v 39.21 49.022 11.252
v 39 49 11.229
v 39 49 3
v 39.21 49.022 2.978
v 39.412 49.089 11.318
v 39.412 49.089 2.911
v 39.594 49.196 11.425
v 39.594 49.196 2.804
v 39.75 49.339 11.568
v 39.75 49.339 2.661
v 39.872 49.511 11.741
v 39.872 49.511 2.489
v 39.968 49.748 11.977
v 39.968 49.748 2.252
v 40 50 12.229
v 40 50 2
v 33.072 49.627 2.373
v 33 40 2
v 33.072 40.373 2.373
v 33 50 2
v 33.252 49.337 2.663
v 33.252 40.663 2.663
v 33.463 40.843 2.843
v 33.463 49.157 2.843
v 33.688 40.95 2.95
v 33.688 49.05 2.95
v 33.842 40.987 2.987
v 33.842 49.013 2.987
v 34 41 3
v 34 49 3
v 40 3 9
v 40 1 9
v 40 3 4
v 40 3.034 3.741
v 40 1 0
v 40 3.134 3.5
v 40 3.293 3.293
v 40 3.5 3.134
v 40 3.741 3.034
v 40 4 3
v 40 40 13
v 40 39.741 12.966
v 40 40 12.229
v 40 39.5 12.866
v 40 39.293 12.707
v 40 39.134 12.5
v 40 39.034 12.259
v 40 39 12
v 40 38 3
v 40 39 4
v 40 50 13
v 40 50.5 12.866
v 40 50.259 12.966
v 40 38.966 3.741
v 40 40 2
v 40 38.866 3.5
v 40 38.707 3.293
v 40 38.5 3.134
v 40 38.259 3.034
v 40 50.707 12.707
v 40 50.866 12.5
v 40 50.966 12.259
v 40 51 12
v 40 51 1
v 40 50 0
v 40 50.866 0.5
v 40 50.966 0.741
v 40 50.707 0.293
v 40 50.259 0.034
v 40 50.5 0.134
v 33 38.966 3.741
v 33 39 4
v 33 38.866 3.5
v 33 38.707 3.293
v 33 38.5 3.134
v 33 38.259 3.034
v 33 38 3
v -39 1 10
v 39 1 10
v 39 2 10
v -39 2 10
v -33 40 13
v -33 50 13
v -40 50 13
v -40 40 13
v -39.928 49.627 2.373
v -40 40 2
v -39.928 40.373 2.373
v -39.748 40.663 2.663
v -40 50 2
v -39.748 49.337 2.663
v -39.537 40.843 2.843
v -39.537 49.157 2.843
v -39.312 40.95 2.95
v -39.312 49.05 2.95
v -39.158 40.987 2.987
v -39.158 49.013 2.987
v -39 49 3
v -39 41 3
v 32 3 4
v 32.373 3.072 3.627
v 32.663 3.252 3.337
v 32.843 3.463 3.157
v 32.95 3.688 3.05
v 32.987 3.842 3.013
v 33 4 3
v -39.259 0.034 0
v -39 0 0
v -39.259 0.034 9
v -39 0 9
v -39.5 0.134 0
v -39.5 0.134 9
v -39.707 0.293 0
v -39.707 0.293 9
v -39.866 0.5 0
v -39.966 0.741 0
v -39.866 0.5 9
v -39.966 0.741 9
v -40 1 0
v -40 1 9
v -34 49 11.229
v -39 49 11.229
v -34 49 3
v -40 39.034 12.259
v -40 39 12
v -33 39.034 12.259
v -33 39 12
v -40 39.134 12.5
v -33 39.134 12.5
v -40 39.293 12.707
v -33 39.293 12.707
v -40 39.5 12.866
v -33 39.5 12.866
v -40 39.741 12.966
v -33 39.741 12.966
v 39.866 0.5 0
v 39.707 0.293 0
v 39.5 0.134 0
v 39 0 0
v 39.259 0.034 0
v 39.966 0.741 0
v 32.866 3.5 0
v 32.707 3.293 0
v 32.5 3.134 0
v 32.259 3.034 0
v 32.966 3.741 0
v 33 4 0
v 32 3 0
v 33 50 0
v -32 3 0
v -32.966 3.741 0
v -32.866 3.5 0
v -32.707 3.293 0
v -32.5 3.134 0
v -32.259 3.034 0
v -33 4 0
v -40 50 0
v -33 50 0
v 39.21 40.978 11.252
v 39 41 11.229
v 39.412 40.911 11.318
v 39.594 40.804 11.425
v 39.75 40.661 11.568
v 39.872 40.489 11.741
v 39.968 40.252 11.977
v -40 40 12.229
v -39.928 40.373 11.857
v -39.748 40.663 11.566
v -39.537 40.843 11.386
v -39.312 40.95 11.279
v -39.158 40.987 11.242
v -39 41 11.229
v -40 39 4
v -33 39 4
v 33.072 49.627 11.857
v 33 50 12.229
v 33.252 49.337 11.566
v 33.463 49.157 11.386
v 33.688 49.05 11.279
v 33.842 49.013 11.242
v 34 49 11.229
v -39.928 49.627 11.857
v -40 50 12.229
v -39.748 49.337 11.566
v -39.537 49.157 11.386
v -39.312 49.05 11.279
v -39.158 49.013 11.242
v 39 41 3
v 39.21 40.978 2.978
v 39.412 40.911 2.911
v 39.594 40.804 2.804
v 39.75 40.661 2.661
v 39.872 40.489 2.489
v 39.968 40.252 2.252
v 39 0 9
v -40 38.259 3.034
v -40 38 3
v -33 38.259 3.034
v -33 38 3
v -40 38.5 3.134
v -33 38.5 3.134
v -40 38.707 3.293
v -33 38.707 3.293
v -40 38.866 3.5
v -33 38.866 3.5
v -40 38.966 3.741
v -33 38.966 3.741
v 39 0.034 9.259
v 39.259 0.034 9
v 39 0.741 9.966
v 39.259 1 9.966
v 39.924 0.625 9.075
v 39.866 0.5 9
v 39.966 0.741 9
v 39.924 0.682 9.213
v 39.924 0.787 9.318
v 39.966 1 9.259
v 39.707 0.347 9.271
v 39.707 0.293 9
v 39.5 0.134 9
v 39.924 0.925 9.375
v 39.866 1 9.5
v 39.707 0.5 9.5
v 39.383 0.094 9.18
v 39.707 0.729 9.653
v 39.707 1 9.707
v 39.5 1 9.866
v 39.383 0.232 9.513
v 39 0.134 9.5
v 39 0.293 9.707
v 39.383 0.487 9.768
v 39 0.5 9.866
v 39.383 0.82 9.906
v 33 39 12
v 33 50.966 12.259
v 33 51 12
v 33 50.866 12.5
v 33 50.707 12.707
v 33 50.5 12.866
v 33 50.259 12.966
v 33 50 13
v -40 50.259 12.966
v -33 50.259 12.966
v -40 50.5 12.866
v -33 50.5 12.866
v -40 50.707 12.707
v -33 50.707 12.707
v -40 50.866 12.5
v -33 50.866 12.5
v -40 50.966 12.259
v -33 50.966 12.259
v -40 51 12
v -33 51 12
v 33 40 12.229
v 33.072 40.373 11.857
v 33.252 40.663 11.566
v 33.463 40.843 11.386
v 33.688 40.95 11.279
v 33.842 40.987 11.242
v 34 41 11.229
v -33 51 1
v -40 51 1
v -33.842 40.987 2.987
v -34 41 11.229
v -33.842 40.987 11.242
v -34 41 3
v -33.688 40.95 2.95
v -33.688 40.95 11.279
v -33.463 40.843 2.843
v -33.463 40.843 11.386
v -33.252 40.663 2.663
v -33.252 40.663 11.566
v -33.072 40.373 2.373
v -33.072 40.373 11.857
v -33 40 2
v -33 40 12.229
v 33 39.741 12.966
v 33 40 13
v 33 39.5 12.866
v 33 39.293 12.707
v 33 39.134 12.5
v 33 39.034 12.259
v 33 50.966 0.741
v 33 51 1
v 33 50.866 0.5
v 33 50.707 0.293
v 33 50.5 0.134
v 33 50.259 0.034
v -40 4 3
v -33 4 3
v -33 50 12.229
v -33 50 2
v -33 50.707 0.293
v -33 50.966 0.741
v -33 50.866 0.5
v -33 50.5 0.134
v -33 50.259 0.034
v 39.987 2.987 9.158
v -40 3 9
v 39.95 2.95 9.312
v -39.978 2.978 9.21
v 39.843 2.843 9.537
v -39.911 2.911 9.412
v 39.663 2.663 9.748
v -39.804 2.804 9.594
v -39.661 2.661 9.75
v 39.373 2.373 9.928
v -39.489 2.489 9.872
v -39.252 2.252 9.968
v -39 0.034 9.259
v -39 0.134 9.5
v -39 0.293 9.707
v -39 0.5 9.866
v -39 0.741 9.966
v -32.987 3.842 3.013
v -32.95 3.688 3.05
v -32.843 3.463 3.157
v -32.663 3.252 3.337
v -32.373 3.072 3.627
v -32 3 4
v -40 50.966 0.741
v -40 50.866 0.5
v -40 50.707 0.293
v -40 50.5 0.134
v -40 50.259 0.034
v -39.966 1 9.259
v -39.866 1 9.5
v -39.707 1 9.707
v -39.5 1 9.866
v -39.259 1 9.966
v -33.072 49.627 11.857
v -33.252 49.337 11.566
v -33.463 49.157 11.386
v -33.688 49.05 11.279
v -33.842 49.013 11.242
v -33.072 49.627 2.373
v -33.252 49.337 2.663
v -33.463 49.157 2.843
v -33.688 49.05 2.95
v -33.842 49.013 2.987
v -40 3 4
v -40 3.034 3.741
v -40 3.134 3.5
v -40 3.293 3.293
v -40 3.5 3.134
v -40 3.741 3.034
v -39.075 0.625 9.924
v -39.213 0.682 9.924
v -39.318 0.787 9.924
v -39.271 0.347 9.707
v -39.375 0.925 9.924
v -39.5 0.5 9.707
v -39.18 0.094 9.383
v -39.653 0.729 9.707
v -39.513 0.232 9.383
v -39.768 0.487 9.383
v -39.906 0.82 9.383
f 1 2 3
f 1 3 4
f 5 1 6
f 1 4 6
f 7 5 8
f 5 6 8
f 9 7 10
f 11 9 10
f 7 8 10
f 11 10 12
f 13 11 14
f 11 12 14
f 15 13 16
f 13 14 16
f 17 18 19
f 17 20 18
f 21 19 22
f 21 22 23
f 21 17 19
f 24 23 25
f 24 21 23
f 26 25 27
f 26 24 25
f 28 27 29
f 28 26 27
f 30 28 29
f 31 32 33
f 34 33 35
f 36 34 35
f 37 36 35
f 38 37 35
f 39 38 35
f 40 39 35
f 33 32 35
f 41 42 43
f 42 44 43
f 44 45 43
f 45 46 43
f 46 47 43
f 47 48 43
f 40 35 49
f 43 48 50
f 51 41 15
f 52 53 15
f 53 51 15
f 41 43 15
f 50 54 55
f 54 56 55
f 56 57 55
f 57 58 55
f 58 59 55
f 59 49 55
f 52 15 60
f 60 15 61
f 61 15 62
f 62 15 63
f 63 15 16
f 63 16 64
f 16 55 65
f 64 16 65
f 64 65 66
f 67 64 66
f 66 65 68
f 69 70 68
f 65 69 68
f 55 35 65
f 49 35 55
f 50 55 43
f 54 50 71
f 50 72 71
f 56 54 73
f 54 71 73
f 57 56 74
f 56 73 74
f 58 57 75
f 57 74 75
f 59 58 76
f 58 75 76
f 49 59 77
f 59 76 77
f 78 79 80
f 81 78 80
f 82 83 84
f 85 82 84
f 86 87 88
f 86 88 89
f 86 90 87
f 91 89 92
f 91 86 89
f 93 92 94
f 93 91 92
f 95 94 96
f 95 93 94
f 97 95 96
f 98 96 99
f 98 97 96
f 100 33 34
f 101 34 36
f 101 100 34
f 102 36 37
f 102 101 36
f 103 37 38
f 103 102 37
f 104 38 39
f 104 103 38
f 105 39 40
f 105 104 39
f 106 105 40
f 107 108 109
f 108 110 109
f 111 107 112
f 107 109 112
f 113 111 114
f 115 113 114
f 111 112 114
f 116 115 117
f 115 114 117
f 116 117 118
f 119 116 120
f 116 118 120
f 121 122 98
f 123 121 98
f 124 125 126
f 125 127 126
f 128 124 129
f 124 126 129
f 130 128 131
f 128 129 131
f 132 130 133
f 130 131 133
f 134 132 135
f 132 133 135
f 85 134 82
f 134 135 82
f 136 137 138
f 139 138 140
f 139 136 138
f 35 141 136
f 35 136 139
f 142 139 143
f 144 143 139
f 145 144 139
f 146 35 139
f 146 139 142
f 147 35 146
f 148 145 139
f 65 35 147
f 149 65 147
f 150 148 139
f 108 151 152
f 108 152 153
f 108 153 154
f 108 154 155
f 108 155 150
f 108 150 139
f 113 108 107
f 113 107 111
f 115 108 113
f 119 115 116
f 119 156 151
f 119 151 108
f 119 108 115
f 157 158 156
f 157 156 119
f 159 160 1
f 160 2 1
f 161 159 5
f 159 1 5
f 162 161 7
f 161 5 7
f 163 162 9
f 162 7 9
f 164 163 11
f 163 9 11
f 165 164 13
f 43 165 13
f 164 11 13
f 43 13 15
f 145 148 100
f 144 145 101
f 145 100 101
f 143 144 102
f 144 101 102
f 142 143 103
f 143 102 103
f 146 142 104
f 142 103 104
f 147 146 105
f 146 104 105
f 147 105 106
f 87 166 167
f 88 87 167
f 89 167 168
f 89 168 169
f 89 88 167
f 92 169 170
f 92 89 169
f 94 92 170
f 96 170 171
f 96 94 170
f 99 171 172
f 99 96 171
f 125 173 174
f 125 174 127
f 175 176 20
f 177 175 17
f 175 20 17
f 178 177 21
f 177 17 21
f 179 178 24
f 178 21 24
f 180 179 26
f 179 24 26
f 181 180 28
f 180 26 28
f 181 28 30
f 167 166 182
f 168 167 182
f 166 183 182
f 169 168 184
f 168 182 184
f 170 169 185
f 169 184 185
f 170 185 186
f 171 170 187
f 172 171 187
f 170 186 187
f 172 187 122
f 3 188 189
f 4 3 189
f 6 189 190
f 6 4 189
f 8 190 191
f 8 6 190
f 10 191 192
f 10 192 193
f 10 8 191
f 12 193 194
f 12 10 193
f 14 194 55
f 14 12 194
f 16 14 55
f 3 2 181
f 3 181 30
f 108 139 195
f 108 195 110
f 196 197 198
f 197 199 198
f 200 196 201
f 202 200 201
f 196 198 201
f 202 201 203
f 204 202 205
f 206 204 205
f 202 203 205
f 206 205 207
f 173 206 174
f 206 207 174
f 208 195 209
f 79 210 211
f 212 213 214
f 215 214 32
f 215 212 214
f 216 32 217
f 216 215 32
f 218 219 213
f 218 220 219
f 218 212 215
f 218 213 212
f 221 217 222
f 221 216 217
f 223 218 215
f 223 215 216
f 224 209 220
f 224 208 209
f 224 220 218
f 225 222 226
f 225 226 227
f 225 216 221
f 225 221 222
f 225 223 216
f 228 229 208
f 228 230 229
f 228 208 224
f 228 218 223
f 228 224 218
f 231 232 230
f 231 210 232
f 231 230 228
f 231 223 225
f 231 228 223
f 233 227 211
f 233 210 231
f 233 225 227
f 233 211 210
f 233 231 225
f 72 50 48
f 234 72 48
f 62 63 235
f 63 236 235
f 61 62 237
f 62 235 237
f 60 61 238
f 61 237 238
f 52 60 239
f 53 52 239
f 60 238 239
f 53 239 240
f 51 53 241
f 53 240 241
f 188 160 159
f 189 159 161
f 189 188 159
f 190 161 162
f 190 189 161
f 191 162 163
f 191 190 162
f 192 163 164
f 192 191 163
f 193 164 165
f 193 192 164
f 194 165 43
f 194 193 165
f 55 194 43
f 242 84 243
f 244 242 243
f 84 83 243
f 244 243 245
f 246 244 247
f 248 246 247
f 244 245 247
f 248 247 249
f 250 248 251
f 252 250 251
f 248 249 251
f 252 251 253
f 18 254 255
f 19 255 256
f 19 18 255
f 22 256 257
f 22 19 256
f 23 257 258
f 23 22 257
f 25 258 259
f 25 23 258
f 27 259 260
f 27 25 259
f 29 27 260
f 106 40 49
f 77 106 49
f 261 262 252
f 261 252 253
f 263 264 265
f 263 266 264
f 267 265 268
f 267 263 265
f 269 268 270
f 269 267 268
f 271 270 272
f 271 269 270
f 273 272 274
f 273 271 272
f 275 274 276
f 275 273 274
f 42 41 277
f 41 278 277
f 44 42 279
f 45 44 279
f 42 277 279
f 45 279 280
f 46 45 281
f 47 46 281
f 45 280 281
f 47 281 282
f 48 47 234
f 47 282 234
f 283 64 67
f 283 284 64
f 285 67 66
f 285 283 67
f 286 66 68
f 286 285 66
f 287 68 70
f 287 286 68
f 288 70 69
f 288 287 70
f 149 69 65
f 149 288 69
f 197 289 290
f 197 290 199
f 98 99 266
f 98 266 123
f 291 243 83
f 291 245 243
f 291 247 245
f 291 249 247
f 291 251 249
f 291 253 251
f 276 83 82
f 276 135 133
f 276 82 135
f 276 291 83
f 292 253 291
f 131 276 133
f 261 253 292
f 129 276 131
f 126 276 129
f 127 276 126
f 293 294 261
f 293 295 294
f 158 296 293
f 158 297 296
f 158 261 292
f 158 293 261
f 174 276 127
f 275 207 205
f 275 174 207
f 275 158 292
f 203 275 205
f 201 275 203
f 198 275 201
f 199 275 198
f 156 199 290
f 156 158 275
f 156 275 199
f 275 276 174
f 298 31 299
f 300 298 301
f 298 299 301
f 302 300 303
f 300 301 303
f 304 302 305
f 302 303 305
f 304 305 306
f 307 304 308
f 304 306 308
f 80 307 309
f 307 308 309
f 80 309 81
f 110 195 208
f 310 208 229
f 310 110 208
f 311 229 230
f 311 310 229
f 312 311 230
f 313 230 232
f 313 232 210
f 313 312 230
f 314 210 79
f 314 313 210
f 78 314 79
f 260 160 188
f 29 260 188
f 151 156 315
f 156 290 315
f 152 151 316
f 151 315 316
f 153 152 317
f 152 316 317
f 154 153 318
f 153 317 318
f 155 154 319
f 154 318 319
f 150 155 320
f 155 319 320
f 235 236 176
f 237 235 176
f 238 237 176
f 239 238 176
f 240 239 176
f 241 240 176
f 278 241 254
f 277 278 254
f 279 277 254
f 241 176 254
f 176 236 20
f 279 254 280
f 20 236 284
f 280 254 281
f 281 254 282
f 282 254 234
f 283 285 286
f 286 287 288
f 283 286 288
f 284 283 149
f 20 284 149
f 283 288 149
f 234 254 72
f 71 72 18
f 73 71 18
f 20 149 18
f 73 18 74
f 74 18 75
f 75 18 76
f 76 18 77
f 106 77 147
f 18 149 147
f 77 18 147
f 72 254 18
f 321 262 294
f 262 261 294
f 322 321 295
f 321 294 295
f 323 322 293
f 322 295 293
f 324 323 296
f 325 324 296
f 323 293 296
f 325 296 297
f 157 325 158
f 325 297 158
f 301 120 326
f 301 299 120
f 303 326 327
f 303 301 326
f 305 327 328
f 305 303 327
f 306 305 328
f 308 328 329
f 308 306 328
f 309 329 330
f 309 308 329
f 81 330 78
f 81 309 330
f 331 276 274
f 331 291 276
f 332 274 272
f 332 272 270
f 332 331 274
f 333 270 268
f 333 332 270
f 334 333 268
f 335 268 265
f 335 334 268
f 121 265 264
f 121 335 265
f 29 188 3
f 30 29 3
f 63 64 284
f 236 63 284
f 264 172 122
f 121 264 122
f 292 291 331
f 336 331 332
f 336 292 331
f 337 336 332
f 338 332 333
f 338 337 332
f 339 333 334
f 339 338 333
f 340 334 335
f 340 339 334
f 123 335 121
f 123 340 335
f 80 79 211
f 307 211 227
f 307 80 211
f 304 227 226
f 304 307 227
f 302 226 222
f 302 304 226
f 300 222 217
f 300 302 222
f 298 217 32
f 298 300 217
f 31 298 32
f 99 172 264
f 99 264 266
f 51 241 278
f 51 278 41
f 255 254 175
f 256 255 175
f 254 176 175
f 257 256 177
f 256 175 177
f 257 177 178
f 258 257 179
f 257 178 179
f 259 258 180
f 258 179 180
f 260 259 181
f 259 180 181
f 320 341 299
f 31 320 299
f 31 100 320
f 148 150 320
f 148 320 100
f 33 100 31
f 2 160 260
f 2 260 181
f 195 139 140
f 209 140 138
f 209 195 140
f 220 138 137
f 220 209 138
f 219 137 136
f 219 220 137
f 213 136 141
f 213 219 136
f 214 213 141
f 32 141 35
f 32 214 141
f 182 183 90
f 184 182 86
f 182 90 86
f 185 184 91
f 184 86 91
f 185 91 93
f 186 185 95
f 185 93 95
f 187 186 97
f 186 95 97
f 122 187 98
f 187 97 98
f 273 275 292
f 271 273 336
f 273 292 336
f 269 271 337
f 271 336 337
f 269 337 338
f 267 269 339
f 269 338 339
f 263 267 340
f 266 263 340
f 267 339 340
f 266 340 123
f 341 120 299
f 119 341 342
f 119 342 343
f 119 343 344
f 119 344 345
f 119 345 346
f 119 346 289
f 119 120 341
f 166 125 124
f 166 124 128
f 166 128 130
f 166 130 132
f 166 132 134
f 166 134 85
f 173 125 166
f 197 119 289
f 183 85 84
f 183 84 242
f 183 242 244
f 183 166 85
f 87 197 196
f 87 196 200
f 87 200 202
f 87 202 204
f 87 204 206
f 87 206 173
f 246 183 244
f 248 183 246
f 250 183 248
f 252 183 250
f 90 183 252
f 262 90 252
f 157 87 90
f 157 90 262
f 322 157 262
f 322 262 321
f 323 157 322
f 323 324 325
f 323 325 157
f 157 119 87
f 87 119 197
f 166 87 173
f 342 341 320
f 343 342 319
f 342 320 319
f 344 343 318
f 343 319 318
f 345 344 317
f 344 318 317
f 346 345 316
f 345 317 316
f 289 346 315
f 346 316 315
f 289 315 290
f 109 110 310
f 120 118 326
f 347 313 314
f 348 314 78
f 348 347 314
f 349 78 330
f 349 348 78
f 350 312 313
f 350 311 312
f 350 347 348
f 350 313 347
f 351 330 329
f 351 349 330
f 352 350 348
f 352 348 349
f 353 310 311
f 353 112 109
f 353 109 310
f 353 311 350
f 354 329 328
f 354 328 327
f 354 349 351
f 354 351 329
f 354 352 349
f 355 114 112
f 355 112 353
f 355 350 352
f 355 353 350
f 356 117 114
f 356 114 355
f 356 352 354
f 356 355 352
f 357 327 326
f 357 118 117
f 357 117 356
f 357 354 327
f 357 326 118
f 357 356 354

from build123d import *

# Parameters (mm, degrees)
BOSS_EXTRUDE1_DEPTH = 13
SKETCH2_W           = 8.229441325
SKETCH2_H           = 8
CUT_EXTRUDE1_DEPTH  = 100
FILLET1_R           = 1


with BuildPart() as part:
    # Sketch1 → Boss-Extrude1 (new body)
    with BuildSketch(Plane.XY):
        Polygon((0, 0), (40, 0), (40, 51), (33, 51), (33, 3), (0, 3), align=None)
    extrude(amount=BOSS_EXTRUDE1_DEPTH)

    # Sketch2 → Cut-Extrude1 (cut)
    with BuildSketch(Plane(origin=(40, 0, 0), x_dir=(0, 0, -1), z_dir=(1, 0, 0))):
        Polygon((-3, 39), (-13, 39), (-13, 0), (-10, 0), (-10, 3), (-3, 3), align=None)
        with Locations((-7.114720663, 45)):
            Rectangle(SKETCH2_W, SKETCH2_H)
    extrude(amount=-CUT_EXTRUDE1_DEPTH, mode=Mode.SUBTRACT)

    # Mirror2: part across plane


with BuildPart() as part_1:
    add(part.part)
    add(part.part.mirror(Plane(origin=(0, 0, 13), x_dir=(0, 0, 1), z_dir=(1, 0, 0))))

    # Fillet1
    fillet1_edges = [part_1.edges().sort_by_distance(p)[0] for p in [
        (-40, 0, 5),
        (0, 0, 10),
        (40, 0, 5),
        (40, 1.5, 10),
        (40, 41, 7.114720663),
        (40, 45, 11.229441325),
        (40, 49, 7.114720663),
        (40, 45, 3),
        (33, 45, 3),
        (33, 3, 1.5),
        (33, 49, 7.114720663),
        (33, 45, 11.229441325),
        (33, 41, 7.114720663),
        (36.5, 3, 3),
        (0, 3, 10),
        (-36.5, 3, 3),
        (-33, 3, 1.5),
        (-33, 45, 3),
        (-33, 49, 7.114720663),
        (-33, 45, 11.229441325),
        (-33, 41, 7.114720663),
        (-40, 41, 7.114720663),
        (-40, 45, 11.229441325),
        (-40, 49, 7.114720663),
        (-40, 45, 3),
        (-36.5, 51, 0),
        (-36.5, 51, 13),
        (-36.5, 39, 13),
        (-36.5, 39, 3),
        (36.5, 39, 3),
        (36.5, 39, 13),
        (36.5, 51, 13),
        (36.5, 51, 0),
        (-40, 1.5, 10),
    ]]
    fillet(fillet1_edges, radius=FILLET1_R)


solid = part_1.part
